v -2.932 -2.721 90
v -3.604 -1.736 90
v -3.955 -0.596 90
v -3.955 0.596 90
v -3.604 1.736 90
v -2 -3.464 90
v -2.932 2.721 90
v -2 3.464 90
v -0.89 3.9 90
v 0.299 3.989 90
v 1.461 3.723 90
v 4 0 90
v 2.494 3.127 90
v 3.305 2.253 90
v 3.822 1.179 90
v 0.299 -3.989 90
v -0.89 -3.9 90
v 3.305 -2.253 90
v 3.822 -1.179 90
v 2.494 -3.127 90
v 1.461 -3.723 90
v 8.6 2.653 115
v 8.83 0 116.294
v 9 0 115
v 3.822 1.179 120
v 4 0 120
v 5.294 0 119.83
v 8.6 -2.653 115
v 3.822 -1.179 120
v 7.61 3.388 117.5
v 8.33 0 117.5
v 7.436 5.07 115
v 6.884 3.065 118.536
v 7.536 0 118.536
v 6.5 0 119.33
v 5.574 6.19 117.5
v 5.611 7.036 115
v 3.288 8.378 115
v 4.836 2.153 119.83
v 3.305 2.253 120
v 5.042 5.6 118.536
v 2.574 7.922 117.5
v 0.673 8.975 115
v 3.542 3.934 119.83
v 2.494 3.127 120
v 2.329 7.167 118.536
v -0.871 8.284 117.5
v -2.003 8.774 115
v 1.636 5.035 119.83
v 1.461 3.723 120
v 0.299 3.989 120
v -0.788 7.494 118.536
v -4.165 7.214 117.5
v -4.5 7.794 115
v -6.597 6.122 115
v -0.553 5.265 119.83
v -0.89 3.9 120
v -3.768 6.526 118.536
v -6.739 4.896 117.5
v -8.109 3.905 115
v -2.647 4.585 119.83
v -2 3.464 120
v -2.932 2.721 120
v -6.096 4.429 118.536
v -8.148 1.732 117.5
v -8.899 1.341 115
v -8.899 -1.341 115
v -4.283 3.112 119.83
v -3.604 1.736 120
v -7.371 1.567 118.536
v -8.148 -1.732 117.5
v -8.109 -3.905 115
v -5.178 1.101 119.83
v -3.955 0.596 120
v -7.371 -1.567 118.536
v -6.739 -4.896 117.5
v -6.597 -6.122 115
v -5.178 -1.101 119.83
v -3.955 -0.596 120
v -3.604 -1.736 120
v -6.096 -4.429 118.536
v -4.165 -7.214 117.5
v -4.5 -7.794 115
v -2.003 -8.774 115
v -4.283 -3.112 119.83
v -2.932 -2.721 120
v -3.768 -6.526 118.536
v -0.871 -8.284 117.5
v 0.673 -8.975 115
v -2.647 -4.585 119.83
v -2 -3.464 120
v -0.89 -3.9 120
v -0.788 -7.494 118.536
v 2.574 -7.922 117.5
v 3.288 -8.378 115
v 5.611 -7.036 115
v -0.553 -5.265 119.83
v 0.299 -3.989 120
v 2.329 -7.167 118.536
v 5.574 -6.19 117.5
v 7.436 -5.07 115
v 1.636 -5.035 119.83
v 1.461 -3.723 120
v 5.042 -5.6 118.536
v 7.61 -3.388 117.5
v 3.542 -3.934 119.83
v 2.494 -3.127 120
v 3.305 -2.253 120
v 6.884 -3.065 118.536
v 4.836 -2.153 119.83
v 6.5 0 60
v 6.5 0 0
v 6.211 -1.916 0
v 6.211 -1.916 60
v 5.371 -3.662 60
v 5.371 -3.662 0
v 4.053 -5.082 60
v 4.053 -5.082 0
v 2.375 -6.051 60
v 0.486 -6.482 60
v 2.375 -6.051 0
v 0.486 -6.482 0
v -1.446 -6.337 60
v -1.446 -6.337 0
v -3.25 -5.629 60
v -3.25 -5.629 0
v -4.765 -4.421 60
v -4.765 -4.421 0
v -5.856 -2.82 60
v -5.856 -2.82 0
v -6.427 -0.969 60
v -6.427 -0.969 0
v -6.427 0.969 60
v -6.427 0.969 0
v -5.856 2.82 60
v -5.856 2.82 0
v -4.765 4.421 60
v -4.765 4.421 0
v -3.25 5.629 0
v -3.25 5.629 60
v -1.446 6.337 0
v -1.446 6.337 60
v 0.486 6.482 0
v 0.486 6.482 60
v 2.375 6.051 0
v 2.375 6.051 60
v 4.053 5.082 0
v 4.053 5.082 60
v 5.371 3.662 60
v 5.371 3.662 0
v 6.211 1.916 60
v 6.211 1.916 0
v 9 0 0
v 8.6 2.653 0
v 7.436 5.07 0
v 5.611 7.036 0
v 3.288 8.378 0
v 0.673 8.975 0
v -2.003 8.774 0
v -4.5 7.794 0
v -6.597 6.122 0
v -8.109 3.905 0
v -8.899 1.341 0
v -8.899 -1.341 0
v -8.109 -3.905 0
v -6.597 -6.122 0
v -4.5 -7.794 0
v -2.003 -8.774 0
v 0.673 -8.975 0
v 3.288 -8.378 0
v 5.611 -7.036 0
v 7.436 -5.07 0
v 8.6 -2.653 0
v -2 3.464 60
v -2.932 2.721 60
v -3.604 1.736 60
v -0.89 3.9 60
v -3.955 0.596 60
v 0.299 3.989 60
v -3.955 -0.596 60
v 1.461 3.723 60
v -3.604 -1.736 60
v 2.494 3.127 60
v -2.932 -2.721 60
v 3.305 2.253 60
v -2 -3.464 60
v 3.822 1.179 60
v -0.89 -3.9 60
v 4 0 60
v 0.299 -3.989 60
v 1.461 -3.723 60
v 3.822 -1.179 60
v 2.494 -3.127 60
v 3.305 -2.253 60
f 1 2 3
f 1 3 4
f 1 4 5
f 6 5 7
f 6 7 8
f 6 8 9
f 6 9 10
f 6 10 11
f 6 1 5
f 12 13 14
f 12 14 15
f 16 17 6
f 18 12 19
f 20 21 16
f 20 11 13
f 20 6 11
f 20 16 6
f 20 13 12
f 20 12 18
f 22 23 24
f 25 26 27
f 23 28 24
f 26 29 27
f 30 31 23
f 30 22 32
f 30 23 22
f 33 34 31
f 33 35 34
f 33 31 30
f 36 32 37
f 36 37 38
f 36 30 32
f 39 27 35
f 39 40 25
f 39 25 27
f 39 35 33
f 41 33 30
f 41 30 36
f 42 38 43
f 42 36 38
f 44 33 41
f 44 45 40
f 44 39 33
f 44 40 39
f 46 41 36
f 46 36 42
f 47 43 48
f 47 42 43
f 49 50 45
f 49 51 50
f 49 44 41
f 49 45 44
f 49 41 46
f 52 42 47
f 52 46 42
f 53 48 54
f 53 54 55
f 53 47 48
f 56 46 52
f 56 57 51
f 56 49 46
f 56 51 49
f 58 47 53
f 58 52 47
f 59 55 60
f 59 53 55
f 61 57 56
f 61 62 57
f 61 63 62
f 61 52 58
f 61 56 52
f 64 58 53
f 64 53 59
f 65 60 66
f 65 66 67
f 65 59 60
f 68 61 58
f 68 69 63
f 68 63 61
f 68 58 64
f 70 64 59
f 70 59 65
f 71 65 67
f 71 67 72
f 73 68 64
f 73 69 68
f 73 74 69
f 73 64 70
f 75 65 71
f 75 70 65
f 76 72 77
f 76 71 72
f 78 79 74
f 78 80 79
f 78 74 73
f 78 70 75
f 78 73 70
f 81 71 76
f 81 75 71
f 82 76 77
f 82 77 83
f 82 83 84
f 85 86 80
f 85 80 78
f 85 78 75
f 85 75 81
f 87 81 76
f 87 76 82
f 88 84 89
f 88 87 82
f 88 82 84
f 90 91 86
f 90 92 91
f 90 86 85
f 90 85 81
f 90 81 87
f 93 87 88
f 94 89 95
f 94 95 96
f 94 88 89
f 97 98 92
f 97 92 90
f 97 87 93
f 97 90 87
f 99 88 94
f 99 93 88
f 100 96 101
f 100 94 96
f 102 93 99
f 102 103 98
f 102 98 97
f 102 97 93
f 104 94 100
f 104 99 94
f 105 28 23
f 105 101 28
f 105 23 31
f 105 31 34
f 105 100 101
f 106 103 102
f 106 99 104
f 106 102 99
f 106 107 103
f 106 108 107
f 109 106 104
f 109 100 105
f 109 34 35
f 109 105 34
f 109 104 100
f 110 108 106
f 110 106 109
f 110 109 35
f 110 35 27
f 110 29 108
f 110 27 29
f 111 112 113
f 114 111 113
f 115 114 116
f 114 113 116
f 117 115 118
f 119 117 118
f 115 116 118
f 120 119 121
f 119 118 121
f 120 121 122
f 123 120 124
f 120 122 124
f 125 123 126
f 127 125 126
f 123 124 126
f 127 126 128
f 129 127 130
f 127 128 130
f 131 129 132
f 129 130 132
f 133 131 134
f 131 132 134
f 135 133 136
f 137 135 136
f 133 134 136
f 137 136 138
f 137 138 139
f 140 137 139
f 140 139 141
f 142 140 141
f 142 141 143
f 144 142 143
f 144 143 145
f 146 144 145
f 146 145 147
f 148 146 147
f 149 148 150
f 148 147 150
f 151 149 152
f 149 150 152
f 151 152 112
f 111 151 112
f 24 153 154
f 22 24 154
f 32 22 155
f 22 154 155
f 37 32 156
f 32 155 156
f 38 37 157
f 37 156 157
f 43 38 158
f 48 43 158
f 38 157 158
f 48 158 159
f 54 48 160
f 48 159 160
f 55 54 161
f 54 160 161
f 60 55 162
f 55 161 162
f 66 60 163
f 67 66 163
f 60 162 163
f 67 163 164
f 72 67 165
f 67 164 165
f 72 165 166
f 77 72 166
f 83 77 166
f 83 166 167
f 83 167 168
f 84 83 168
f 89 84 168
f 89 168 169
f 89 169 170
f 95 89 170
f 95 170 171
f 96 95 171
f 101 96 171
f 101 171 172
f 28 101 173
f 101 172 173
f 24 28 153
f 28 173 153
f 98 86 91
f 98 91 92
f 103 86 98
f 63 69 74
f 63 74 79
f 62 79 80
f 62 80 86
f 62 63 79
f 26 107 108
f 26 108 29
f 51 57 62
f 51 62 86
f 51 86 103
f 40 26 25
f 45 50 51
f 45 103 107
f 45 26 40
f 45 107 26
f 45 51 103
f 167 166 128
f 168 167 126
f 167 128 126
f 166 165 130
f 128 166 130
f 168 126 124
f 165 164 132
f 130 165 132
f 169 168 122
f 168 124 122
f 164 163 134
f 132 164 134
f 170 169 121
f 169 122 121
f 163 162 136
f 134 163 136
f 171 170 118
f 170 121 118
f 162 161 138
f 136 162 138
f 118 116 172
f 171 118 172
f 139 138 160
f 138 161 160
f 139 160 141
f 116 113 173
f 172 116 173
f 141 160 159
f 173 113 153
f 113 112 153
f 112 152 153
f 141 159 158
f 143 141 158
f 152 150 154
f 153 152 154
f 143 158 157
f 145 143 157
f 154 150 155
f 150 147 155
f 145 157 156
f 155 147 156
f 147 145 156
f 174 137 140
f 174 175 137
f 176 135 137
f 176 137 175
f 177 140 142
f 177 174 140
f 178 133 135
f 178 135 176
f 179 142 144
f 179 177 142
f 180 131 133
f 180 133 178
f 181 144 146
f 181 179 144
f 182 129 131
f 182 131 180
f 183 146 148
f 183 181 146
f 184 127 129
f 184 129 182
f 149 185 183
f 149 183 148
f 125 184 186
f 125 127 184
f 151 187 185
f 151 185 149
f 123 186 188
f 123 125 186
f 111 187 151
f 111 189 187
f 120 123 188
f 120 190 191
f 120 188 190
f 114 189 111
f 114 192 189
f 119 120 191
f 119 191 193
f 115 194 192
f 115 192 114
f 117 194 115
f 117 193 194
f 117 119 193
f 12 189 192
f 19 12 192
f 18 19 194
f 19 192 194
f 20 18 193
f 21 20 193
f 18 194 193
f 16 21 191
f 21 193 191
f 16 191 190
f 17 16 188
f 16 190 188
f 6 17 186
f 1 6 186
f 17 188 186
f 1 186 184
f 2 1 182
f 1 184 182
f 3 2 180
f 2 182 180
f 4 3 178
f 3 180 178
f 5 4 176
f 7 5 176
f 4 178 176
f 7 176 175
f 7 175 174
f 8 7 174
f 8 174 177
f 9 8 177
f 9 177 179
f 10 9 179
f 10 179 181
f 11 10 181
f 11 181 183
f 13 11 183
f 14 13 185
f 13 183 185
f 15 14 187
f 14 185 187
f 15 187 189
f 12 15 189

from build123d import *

# Parameters (mm, degrees)
F0_R     = 9
F1_DEPTH = 120
F2_R     = 6.5
F3_DEPTH = 60
F4_R     = 4
F5_DEPTH = 30
F6_R     = 5


with BuildPart() as f1:
    # F0 (on Top) → F1 (new body)
    with BuildSketch(Plane.XY):
        Circle(F0_R)
    extrude(amount=F1_DEPTH)

    # F2 (on face) → F3 (cut)
    with BuildSketch(Plane(origin=(0, 0, 0), x_dir=(1, 0, 0), z_dir=(0, 0, -1))):
        Circle(F2_R)
    extrude(amount=-F3_DEPTH, mode=Mode.SUBTRACT)

    # F4 (on face) → F5 (cut)
    with BuildSketch(Plane(origin=(0, 0, 60), x_dir=(1, 0, 0), z_dir=(0, 0, -1))):
        Circle(F4_R)
    extrude(amount=-F5_DEPTH, mode=Mode.SUBTRACT)

    # F6
    f6_edges = [f1.edges().sort_by_distance(p)[0] for p in [
        (-9, 0, 120),
    ]]
    fillet(f6_edges, radius=F6_R)


solid = f1.part
